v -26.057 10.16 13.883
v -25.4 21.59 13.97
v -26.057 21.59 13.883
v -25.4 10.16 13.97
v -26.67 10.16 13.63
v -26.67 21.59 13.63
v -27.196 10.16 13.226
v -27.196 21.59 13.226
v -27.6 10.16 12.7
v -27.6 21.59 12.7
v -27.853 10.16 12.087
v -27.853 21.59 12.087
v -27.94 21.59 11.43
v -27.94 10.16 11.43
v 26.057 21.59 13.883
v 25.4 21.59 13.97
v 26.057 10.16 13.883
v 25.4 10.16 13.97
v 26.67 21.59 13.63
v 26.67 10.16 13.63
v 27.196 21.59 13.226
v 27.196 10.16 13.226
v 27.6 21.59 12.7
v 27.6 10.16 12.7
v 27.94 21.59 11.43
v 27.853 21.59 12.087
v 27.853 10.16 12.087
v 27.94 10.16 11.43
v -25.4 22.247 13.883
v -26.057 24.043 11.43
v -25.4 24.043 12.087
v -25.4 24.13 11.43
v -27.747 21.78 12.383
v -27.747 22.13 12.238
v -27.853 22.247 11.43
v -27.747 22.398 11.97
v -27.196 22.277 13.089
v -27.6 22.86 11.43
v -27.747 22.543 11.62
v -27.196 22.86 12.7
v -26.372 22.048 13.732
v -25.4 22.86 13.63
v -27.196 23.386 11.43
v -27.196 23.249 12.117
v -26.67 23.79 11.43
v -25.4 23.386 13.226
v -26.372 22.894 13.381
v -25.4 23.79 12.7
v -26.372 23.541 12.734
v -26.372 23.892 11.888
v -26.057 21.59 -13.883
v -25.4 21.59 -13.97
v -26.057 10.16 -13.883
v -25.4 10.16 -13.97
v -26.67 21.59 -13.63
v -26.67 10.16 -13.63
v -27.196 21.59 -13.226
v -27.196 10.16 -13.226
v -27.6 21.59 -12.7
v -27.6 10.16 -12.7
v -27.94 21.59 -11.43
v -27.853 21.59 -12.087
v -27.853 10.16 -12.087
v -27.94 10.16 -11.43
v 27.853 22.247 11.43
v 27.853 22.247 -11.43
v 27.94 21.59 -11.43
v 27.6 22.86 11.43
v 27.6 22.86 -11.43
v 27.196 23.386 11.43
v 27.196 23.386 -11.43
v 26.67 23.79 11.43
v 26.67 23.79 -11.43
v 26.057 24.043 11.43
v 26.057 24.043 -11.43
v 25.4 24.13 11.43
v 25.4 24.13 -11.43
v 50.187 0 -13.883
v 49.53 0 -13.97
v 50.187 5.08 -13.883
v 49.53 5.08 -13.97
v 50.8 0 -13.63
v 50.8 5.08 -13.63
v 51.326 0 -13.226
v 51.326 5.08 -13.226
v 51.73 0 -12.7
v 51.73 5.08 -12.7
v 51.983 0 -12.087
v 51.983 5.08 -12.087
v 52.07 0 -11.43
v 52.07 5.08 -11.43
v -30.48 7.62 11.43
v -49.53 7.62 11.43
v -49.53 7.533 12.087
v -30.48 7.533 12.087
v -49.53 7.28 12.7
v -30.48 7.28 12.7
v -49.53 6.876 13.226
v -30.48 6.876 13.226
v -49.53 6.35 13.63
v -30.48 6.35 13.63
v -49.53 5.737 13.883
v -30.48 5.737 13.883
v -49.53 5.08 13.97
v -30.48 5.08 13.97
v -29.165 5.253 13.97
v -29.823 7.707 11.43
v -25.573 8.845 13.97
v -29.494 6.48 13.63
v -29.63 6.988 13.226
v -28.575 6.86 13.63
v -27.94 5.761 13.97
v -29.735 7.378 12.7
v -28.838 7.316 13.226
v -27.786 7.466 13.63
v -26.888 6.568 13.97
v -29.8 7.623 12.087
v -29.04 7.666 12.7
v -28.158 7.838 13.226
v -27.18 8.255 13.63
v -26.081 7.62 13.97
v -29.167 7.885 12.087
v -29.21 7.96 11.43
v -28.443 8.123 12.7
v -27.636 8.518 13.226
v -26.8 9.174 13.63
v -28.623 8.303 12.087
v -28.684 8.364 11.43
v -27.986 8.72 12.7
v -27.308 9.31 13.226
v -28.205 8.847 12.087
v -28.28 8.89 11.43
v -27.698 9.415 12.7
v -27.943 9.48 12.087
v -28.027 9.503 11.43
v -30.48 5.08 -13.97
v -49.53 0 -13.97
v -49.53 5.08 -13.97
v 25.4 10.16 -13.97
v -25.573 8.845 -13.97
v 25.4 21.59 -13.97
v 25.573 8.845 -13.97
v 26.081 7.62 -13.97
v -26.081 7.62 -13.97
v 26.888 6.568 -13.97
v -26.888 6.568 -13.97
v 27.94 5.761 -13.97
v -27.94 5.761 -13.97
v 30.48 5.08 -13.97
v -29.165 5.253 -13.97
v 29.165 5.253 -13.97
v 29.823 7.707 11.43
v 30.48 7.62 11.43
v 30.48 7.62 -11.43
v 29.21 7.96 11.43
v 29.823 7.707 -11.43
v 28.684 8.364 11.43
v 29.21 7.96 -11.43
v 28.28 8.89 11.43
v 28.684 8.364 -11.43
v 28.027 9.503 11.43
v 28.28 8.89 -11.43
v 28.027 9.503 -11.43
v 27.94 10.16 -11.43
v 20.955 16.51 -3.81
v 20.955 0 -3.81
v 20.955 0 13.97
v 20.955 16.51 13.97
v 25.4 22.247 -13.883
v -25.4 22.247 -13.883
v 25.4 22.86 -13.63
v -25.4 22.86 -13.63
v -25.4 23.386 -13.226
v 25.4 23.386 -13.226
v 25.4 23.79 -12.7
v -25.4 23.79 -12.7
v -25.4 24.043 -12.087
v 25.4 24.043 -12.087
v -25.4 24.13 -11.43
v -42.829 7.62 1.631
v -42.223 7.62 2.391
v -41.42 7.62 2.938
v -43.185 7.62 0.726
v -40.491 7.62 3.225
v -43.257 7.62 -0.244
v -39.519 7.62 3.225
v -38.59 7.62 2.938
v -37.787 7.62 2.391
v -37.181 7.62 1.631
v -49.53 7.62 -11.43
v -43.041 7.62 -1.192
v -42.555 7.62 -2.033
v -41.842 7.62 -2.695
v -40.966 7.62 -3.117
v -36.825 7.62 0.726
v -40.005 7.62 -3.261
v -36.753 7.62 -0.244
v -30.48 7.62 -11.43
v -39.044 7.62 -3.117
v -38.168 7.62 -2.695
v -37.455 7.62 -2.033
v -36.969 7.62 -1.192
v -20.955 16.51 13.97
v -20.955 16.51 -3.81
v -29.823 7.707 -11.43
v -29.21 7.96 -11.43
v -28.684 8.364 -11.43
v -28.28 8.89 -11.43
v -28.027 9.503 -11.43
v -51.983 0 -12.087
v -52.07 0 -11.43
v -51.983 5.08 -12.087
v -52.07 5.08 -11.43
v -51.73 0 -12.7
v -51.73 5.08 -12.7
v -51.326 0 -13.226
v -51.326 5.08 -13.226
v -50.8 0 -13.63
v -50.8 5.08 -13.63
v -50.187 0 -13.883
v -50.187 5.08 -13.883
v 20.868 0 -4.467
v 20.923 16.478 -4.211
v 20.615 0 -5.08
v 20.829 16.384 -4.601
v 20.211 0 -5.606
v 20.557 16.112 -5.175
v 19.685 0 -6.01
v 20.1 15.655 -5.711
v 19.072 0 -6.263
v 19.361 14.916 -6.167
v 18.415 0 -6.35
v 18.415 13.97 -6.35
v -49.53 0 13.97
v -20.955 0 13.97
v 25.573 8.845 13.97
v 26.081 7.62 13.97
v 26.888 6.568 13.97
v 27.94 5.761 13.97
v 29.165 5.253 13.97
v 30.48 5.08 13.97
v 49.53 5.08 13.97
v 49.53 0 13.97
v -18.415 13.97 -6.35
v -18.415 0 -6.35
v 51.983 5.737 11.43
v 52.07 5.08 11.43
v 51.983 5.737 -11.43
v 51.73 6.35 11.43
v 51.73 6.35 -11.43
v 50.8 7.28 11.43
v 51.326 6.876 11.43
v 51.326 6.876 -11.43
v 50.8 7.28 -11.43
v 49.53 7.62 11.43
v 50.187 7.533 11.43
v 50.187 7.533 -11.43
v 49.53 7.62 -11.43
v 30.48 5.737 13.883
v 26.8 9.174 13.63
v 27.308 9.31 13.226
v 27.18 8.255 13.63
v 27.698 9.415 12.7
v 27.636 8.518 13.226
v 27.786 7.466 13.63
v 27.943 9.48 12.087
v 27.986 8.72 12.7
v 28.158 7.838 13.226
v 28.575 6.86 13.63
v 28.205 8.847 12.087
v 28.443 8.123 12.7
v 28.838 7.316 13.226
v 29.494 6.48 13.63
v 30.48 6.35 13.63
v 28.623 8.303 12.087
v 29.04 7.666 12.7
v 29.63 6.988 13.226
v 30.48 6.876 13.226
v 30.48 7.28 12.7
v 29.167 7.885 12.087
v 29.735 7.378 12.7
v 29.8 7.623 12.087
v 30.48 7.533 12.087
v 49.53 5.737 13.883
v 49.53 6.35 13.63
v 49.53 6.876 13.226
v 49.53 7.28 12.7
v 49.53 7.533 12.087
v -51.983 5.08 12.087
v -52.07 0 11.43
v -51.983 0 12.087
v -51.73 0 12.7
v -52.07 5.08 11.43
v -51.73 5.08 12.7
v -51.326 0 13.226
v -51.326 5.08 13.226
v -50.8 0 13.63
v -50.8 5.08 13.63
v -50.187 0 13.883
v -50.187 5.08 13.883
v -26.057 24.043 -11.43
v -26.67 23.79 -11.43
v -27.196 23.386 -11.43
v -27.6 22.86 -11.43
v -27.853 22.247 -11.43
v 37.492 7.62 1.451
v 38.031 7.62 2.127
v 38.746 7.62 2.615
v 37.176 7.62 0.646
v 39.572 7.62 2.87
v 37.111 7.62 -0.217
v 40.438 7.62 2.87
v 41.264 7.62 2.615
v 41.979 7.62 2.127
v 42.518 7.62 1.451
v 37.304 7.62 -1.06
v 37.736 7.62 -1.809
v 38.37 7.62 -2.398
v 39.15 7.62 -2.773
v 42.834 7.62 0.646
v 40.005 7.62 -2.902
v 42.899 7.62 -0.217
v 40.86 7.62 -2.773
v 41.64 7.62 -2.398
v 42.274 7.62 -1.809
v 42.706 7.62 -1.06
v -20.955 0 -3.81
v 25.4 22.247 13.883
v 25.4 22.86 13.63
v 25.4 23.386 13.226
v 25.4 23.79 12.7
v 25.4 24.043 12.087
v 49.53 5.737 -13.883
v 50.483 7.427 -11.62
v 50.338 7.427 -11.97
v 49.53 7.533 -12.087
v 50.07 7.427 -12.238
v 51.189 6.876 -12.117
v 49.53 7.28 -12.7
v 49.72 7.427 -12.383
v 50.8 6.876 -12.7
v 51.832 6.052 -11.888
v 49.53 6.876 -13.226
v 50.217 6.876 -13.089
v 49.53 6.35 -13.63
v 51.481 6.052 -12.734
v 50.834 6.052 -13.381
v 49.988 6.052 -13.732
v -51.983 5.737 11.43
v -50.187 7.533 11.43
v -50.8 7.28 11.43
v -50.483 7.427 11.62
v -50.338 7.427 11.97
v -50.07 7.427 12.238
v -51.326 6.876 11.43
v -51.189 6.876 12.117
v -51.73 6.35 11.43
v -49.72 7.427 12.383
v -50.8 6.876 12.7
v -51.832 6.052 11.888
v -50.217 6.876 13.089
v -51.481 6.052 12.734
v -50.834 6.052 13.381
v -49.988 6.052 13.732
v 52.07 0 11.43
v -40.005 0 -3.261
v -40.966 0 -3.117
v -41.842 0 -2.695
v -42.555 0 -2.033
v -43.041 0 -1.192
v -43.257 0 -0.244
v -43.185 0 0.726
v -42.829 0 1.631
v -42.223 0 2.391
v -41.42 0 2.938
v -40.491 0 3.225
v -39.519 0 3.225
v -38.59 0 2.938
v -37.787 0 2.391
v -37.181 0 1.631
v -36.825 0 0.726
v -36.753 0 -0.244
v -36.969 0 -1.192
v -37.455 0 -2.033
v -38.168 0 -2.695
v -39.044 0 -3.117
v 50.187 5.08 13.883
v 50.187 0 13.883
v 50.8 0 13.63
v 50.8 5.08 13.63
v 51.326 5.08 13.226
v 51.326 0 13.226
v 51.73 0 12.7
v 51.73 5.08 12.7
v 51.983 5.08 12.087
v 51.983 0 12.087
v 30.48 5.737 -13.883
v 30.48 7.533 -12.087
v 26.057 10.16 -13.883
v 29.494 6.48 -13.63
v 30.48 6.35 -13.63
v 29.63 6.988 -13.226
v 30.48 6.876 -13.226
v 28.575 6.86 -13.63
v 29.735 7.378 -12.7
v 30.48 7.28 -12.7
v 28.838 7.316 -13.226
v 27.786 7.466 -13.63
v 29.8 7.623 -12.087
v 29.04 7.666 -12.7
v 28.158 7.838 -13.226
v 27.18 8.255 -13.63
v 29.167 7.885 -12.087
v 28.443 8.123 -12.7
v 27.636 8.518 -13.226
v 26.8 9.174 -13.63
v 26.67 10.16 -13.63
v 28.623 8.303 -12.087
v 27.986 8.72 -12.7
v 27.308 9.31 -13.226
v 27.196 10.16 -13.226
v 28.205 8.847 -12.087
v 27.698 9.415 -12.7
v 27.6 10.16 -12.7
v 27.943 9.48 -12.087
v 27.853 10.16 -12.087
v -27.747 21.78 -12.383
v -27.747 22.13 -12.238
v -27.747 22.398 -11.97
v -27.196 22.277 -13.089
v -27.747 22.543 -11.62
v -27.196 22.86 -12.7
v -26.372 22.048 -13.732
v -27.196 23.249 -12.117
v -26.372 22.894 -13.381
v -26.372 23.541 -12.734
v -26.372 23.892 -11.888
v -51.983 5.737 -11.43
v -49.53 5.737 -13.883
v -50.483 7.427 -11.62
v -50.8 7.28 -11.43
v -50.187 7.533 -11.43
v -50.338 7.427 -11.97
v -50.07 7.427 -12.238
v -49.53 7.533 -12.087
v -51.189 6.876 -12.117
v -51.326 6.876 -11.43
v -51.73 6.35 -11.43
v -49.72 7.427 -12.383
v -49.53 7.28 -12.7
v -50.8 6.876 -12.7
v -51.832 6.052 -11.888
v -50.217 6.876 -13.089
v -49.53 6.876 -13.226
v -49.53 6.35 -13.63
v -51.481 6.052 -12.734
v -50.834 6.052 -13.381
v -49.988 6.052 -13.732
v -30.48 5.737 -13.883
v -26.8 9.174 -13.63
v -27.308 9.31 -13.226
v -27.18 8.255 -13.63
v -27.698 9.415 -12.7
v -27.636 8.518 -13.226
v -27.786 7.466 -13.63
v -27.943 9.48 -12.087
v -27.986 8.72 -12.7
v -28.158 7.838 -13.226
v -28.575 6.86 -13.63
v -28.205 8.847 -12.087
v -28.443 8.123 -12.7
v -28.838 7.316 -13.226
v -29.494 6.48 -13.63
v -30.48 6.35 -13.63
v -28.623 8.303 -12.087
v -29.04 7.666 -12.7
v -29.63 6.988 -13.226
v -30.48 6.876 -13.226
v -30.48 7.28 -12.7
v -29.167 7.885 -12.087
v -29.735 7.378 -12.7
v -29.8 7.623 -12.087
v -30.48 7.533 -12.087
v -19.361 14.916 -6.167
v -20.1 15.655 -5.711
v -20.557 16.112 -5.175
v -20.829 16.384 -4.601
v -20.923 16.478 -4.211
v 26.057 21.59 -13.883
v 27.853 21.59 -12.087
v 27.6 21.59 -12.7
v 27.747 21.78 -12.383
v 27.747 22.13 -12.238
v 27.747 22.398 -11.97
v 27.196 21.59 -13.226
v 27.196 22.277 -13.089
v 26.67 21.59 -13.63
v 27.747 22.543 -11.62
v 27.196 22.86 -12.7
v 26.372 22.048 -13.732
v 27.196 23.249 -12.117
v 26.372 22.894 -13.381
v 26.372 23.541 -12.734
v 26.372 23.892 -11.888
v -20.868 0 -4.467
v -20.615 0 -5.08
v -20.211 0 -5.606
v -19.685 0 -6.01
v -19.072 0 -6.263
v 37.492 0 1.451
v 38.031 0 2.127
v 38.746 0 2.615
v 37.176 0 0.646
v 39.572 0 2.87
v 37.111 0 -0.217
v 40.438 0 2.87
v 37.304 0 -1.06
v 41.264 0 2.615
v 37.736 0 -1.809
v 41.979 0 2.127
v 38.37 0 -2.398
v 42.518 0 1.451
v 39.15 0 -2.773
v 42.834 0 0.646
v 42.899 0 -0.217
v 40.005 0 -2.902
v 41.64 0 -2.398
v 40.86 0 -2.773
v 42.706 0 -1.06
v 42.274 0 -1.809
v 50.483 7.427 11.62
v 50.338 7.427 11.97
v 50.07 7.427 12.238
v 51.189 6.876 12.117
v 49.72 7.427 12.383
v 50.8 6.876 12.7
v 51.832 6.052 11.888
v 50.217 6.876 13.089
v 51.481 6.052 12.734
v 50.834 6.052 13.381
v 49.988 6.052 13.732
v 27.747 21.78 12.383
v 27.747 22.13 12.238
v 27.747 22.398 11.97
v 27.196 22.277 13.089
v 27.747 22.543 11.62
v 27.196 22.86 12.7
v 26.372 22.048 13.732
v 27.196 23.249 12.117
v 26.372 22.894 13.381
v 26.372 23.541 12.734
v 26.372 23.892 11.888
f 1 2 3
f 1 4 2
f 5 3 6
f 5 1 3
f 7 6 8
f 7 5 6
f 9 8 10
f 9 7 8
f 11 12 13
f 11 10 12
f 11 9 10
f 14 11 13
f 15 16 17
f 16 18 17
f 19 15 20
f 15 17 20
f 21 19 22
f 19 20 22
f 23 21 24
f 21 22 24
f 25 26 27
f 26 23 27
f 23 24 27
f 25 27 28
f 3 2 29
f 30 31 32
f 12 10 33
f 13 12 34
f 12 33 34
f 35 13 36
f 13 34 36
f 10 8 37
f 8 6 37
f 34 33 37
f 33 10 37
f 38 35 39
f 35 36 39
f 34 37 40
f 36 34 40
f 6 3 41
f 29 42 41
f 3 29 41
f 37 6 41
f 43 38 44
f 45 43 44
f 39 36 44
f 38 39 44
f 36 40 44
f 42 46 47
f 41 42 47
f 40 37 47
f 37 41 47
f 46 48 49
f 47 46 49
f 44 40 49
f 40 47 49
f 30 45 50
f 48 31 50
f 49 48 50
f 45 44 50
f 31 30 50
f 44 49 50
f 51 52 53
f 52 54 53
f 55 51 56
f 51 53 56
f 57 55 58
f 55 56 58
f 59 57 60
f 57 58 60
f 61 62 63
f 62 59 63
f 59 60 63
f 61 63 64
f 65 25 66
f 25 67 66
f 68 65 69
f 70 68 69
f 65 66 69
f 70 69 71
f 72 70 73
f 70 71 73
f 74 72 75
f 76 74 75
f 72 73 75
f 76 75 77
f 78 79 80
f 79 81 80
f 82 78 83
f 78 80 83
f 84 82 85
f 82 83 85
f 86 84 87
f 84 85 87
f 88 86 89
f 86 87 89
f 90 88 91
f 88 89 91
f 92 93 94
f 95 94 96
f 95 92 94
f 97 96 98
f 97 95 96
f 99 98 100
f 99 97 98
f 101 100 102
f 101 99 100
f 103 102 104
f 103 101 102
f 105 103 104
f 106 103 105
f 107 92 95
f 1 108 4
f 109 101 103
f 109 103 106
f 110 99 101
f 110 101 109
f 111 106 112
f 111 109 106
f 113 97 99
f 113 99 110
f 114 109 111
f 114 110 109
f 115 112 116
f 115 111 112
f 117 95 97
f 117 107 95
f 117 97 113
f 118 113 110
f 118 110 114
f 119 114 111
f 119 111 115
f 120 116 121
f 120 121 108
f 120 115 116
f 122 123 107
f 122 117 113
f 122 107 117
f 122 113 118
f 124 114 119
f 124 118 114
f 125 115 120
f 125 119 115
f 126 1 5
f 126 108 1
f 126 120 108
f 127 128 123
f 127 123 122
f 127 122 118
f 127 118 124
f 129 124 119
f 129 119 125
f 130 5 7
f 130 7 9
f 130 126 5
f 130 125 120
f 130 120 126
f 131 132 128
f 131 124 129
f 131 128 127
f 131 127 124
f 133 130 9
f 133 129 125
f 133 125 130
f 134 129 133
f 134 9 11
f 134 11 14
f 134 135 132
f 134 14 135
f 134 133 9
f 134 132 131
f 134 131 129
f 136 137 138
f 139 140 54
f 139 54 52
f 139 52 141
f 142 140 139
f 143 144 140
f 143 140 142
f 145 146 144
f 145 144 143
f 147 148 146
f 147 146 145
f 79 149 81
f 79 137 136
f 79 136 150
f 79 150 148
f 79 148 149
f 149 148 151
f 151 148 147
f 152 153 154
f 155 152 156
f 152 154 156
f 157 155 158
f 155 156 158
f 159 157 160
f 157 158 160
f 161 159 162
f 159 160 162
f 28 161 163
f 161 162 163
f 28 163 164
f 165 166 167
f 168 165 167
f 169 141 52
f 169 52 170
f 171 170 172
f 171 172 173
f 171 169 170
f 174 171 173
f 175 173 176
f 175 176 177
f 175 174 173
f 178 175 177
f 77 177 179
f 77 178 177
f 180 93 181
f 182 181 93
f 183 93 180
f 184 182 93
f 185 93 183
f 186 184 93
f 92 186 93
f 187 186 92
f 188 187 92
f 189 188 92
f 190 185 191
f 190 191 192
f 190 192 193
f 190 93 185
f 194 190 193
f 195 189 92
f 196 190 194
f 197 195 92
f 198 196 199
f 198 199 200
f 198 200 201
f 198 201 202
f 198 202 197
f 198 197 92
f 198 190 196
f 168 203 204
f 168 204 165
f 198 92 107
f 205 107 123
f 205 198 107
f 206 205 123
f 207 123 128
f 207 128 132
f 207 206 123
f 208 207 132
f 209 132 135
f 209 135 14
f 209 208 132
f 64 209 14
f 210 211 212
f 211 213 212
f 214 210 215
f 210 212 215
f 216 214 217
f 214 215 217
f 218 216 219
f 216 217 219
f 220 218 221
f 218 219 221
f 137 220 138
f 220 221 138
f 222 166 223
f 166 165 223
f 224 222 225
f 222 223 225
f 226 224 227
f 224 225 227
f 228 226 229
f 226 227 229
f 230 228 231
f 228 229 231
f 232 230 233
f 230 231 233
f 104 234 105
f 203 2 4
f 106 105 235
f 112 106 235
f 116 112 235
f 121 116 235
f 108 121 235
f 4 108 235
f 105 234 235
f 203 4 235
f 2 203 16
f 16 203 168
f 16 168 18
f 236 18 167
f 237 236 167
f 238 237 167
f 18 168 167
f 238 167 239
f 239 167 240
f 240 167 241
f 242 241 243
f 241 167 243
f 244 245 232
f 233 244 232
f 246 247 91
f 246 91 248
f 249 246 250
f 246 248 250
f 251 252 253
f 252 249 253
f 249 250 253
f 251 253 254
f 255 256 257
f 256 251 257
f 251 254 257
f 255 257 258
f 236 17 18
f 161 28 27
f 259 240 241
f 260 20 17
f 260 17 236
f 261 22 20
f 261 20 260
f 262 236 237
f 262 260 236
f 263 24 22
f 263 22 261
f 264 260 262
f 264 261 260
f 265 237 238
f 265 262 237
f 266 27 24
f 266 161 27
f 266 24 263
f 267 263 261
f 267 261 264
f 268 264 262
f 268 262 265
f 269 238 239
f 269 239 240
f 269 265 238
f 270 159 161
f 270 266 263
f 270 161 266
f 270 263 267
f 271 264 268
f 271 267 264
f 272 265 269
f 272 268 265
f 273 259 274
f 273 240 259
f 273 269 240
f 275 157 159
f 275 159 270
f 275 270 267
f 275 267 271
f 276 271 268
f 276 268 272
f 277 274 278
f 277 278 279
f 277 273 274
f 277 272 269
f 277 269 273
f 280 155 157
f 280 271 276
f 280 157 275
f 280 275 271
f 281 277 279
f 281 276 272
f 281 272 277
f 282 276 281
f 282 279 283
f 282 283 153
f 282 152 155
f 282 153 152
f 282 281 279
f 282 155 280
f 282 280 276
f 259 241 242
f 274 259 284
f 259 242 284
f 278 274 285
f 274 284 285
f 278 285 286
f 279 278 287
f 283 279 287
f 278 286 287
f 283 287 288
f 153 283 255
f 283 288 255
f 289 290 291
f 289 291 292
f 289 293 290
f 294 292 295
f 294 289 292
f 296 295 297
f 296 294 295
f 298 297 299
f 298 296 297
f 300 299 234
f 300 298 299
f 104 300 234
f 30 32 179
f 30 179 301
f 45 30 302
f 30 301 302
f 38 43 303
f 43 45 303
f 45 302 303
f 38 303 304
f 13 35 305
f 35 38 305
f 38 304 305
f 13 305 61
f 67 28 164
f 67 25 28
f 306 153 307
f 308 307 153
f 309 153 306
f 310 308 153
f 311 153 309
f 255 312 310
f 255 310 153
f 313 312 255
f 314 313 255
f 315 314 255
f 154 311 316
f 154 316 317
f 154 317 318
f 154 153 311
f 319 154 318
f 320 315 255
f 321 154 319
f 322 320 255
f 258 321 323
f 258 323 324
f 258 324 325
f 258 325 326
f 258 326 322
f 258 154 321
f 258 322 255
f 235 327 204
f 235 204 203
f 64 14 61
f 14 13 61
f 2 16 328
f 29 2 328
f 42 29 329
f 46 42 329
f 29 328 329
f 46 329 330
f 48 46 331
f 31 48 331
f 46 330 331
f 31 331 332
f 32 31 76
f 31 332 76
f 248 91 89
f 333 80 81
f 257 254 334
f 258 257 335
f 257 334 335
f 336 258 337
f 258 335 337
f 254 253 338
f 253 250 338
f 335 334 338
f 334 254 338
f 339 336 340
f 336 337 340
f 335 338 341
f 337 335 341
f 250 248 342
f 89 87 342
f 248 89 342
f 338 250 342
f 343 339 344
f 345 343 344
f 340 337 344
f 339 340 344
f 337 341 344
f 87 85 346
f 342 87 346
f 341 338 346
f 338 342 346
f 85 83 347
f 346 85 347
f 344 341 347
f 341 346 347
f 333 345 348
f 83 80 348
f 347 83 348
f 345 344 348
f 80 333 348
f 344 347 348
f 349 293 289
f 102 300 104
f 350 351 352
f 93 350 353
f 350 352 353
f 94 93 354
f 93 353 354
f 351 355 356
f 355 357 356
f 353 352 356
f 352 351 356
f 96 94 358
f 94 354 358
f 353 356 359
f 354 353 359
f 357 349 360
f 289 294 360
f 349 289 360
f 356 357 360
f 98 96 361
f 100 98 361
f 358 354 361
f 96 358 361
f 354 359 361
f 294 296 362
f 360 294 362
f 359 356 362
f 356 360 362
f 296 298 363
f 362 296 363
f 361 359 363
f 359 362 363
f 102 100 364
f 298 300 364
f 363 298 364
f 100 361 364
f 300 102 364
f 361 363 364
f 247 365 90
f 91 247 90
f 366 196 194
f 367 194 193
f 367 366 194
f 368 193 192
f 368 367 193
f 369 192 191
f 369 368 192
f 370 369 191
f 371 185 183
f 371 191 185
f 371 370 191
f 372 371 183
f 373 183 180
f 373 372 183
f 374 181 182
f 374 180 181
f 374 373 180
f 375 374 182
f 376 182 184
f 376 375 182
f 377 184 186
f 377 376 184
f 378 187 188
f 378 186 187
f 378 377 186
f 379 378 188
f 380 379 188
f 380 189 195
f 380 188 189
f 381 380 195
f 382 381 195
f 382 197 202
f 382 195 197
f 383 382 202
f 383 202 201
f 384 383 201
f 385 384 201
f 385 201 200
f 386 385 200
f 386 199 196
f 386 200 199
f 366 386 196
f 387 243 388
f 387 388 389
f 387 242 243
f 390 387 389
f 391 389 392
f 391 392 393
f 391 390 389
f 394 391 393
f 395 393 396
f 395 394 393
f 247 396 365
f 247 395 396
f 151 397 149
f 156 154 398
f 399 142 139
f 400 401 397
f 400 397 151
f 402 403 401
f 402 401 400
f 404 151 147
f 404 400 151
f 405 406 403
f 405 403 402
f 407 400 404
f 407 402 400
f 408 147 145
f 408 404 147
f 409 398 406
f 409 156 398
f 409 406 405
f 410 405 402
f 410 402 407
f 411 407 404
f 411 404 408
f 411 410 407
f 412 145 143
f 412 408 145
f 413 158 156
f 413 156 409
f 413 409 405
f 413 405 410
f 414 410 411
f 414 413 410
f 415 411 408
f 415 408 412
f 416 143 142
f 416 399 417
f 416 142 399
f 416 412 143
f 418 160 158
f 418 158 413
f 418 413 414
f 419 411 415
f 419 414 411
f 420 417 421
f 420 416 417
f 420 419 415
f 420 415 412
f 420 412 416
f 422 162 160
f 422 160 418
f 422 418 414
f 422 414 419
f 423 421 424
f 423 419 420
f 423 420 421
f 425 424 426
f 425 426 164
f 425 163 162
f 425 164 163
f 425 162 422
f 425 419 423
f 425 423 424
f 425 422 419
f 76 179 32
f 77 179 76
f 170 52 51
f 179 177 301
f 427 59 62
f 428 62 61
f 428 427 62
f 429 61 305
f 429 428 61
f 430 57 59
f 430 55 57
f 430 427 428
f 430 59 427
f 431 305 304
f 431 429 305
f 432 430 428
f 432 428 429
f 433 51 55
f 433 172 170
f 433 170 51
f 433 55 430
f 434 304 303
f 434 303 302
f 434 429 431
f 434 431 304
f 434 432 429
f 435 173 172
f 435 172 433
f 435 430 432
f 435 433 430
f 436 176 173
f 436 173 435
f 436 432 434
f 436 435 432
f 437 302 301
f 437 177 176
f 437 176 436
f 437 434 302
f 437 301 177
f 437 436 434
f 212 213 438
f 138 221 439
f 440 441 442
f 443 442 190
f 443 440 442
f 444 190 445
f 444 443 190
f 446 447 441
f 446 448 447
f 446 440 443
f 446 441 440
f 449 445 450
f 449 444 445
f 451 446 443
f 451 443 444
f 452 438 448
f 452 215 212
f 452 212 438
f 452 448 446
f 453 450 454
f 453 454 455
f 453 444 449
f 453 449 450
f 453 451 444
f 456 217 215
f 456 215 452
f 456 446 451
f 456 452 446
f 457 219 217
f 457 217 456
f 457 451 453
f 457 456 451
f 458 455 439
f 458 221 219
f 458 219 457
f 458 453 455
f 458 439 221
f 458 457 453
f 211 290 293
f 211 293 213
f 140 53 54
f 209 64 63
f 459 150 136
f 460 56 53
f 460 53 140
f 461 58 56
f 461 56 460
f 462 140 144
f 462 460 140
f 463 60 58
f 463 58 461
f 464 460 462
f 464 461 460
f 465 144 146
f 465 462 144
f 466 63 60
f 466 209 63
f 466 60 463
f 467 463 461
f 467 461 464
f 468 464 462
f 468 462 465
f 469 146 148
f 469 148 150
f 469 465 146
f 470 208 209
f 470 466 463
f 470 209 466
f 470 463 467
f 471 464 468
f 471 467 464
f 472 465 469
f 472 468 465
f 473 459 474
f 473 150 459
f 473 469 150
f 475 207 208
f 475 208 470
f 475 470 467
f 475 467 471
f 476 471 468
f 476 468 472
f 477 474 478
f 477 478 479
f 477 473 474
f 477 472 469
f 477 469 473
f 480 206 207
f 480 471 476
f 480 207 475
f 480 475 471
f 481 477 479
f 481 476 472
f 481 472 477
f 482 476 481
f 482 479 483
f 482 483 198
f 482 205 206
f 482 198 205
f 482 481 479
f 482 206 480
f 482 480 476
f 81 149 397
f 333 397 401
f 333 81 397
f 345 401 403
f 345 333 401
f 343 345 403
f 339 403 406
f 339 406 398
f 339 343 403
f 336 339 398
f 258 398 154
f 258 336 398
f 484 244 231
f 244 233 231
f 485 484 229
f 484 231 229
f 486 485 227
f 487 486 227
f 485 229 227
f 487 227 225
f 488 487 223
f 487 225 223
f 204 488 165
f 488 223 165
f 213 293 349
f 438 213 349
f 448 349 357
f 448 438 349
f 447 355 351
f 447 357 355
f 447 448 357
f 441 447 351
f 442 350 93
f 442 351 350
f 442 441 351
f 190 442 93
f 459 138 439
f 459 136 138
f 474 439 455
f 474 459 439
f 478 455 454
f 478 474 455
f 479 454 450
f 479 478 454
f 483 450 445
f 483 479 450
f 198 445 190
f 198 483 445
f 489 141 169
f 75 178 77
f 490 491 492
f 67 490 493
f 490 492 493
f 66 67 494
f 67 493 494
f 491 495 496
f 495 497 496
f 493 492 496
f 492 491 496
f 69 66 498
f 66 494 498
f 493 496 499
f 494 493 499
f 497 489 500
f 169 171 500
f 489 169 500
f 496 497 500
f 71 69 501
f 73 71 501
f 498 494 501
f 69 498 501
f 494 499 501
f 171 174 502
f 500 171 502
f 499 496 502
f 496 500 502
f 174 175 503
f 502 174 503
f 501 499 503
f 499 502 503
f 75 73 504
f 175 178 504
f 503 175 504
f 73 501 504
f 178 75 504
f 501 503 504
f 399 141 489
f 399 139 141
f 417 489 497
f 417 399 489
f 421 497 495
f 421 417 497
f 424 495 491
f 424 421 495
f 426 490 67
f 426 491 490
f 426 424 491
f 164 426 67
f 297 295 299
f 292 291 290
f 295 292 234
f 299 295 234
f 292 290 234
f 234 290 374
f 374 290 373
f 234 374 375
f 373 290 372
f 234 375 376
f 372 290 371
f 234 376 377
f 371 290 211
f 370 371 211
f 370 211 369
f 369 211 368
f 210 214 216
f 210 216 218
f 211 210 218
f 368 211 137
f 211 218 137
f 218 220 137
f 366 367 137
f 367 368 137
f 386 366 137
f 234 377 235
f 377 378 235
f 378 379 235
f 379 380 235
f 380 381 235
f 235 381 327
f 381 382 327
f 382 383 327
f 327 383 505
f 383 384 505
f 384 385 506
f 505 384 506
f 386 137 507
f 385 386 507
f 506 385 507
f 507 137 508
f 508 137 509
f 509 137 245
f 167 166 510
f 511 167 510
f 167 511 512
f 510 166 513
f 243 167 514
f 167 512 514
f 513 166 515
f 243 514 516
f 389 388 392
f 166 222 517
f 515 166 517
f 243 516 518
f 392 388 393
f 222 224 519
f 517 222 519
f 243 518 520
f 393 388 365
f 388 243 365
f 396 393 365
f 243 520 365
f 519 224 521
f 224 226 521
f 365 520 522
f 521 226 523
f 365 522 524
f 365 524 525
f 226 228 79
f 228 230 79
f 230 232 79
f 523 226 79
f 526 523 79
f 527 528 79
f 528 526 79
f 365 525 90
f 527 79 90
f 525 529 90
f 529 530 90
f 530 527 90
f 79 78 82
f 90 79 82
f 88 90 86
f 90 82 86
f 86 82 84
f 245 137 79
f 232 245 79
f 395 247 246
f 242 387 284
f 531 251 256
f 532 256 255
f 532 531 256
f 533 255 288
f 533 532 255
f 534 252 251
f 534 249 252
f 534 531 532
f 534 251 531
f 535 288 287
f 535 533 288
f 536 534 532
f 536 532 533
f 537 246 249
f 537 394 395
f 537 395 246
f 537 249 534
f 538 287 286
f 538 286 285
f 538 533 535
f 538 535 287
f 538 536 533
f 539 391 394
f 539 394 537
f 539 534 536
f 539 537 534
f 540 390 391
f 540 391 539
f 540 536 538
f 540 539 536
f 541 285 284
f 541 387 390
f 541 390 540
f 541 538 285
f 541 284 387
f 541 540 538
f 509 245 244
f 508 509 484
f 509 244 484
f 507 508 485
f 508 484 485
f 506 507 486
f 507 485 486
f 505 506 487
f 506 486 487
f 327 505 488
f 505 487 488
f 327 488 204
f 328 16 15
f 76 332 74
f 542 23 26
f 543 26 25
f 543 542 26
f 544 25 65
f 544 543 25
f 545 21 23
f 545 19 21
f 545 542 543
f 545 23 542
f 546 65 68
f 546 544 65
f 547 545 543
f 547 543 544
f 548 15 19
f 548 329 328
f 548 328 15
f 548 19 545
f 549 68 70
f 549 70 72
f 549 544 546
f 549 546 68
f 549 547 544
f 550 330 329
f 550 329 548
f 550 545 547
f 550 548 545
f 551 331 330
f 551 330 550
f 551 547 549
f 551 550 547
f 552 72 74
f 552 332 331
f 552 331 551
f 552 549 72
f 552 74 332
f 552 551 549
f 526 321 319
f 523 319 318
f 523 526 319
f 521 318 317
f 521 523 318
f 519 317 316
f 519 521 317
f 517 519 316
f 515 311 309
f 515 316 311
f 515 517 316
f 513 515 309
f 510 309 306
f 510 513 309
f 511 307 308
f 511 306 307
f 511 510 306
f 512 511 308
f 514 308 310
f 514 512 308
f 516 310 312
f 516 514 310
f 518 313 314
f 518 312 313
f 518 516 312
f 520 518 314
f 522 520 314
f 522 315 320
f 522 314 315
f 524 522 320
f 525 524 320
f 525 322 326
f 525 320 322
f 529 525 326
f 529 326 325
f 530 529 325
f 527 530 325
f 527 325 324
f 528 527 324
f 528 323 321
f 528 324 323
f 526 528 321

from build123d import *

# Parameters (mm, degrees)
SKETCH1_W           = 104.14
SKETCH1_H           = 27.94
SKETCH1_R           = 2.902024653
SKETCH1_R_2         = 3.261420209
BOSS_EXTRUDE1_DEPTH = 24.13
SKETCH2_W           = 41.91
SKETCH2_H           = 20.32
CUT_EXTRUDE1_DEPTH  = 16.51
SKETCH4_W           = 24.13
SKETCH4_H           = 27.94
CUT_EXTRUDE2_DEPTH  = 16.51
FILLET1_R           = 2.54


with BuildPart() as part:
    # Sketch1 → Boss-Extrude1 (new body)
    with BuildSketch(Plane(origin=(0, 0, 0), x_dir=(1, 0, 0), z_dir=(0, 1, 0))):
        Rectangle(SKETCH1_W, SKETCH1_H)
        with Locations(Location((40.005, 0, 0), (0, 0, 90))):
            Circle(SKETCH1_R, mode=Mode.SUBTRACT)
        with Locations(Location((-40.005, 0, 0), (0, 0, 90))):
            Circle(SKETCH1_R_2, mode=Mode.SUBTRACT)
    extrude(amount=BOSS_EXTRUDE1_DEPTH)

    # Sketch2 → Cut-Extrude1 (cut)
    with BuildSketch(Plane.XZ):
        with Locations((0, 3.81)):
            Rectangle(SKETCH2_W, SKETCH2_H)
    extrude(amount=-CUT_EXTRUDE1_DEPTH, mode=Mode.SUBTRACT)

    # Sketch4 → Cut-Extrude2 (cut)
    with BuildSketch(Plane(origin=(0, 24.13, 0), x_dir=(1, 0, 0), z_dir=(0, 1, 0))):
        with Locations((-40.005, 0)):
            Rectangle(SKETCH4_W, SKETCH4_H)
        with Locations((40.005, 0)):
            Rectangle(SKETCH4_W, SKETCH4_H)
    extrude(amount=-CUT_EXTRUDE2_DEPTH, mode=Mode.SUBTRACT)

    # Fillet1
    fillet1_edges = [part.edges().sort_by_distance(p)[0] for p in [
        (-20.955, 8.255, -6.35),
        (0, 16.51, -6.35),
        (20.955, 8.255, -6.35),
        (52.07, 3.81, 13.97),
        (0, 24.13, 13.97),
        (-52.07, 3.81, 13.97),
        (-52.07, 3.81, -13.97),
        (0, 24.13, -13.97),
        (52.07, 3.81, -13.97),
        (-52.07, 7.62, 0),
        (-40.005, 7.62, -13.97),
        (-27.94, 7.62, 0),
        (-27.94, 15.875, -13.97),
        (-40.005, 7.62, 13.97),
        (-27.94, 15.875, 13.97),
        (-27.94, 24.13, 0),
        (52.07, 7.62, 0),
        (40.005, 7.62, 13.97),
        (27.94, 7.62, 0),
        (27.94, 15.875, 13.97),
        (40.005, 7.62, -13.97),
        (27.94, 15.875, -13.97),
        (27.94, 24.13, 0),
    ]]
    fillet(fillet1_edges, radius=FILLET1_R)


solid = part.part
